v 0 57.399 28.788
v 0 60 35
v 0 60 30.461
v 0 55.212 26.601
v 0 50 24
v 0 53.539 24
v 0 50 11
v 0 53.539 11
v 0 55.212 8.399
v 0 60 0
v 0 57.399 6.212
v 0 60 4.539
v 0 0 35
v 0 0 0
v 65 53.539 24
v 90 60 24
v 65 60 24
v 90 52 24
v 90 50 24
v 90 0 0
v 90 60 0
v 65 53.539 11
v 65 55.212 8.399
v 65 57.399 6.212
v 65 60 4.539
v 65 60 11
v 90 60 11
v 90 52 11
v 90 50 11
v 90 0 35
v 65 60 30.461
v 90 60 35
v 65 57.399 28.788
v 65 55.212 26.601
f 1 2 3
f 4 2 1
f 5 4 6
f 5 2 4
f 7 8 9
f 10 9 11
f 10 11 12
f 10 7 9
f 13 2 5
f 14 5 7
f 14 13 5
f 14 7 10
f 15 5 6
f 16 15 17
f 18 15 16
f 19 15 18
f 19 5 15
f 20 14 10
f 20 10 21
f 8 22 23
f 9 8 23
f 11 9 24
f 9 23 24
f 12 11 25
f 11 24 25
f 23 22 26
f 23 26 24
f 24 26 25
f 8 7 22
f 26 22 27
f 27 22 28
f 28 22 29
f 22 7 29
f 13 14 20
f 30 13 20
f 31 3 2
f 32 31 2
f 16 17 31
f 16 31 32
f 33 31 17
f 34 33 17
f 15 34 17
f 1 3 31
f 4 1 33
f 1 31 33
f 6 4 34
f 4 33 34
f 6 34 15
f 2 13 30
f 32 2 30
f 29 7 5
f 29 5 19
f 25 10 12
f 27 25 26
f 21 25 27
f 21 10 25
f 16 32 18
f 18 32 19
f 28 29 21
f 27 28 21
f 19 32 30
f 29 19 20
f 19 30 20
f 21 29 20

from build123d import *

# Parameters (mm, degrees)
SKETCH1_W               = 90
SKETCH1_H               = 35
BOSS_EXTRUDE1_DEPTH     = 60
SKETCH2_W               = 25
SKETCH2_H               = 13
CUT_EXTRUDE1_DEPTH      = 8
SKETCH3_R               = 14.5
CUT_EXTRUDE2_DEPTH      = 96.131487952
CUT_EXTRUDE8_DEPTH      = 110.676797911
CUT_EXTRUDE8_DEPTH_BACK = 2
SKETCH4_W               = 95.939068785
SKETCH4_H               = 13


with BuildPart() as part:
    # Sketch1 → Boss-Extrude1 (new body)
    with BuildSketch(Plane(origin=(0, 0, 0), x_dir=(1, 0, 0), z_dir=(0, 1, 0))):
        with Locations((45, -17.5)):
            Rectangle(SKETCH1_W, SKETCH1_H)
    extrude(amount=BOSS_EXTRUDE1_DEPTH)

    # Sketch2 → Cut-Extrude1 (cut)
    with BuildSketch(Plane(origin=(0, 60, 0), x_dir=(1, 0, 0), z_dir=(0, 1, 0))):
        with Locations((77.5, -17.5)):
            Rectangle(SKETCH2_W, SKETCH2_H)
    extrude(amount=-CUT_EXTRUDE1_DEPTH, mode=Mode.SUBTRACT)

    # Sketch3 → Cut-Extrude2 (cut, through all)
    with BuildSketch(Plane(origin=(65, 0, 0), x_dir=(0, 0, -1), z_dir=(1, 0, 0))):
        with Locations((-17.5, 66.5)):
            Circle(SKETCH3_R)
    extrude(amount=-CUT_EXTRUDE2_DEPTH, mode=Mode.SUBTRACT)

    # Sketch4 → Cut-Extrude8 (cut, two sides: drawn at the far end of the back side and taken through both)
    with BuildSketch(Plane(origin=(0, 52, 0), x_dir=(1, 0, 0), z_dir=(0, 1, 0)).offset(-CUT_EXTRUDE8_DEPTH_BACK)):
        with Locations((42.030465607, -17.5)):
            Rectangle(SKETCH4_W, SKETCH4_H)
    extrude(amount=CUT_EXTRUDE8_DEPTH + CUT_EXTRUDE8_DEPTH_BACK, mode=Mode.SUBTRACT)


solid = part.part
